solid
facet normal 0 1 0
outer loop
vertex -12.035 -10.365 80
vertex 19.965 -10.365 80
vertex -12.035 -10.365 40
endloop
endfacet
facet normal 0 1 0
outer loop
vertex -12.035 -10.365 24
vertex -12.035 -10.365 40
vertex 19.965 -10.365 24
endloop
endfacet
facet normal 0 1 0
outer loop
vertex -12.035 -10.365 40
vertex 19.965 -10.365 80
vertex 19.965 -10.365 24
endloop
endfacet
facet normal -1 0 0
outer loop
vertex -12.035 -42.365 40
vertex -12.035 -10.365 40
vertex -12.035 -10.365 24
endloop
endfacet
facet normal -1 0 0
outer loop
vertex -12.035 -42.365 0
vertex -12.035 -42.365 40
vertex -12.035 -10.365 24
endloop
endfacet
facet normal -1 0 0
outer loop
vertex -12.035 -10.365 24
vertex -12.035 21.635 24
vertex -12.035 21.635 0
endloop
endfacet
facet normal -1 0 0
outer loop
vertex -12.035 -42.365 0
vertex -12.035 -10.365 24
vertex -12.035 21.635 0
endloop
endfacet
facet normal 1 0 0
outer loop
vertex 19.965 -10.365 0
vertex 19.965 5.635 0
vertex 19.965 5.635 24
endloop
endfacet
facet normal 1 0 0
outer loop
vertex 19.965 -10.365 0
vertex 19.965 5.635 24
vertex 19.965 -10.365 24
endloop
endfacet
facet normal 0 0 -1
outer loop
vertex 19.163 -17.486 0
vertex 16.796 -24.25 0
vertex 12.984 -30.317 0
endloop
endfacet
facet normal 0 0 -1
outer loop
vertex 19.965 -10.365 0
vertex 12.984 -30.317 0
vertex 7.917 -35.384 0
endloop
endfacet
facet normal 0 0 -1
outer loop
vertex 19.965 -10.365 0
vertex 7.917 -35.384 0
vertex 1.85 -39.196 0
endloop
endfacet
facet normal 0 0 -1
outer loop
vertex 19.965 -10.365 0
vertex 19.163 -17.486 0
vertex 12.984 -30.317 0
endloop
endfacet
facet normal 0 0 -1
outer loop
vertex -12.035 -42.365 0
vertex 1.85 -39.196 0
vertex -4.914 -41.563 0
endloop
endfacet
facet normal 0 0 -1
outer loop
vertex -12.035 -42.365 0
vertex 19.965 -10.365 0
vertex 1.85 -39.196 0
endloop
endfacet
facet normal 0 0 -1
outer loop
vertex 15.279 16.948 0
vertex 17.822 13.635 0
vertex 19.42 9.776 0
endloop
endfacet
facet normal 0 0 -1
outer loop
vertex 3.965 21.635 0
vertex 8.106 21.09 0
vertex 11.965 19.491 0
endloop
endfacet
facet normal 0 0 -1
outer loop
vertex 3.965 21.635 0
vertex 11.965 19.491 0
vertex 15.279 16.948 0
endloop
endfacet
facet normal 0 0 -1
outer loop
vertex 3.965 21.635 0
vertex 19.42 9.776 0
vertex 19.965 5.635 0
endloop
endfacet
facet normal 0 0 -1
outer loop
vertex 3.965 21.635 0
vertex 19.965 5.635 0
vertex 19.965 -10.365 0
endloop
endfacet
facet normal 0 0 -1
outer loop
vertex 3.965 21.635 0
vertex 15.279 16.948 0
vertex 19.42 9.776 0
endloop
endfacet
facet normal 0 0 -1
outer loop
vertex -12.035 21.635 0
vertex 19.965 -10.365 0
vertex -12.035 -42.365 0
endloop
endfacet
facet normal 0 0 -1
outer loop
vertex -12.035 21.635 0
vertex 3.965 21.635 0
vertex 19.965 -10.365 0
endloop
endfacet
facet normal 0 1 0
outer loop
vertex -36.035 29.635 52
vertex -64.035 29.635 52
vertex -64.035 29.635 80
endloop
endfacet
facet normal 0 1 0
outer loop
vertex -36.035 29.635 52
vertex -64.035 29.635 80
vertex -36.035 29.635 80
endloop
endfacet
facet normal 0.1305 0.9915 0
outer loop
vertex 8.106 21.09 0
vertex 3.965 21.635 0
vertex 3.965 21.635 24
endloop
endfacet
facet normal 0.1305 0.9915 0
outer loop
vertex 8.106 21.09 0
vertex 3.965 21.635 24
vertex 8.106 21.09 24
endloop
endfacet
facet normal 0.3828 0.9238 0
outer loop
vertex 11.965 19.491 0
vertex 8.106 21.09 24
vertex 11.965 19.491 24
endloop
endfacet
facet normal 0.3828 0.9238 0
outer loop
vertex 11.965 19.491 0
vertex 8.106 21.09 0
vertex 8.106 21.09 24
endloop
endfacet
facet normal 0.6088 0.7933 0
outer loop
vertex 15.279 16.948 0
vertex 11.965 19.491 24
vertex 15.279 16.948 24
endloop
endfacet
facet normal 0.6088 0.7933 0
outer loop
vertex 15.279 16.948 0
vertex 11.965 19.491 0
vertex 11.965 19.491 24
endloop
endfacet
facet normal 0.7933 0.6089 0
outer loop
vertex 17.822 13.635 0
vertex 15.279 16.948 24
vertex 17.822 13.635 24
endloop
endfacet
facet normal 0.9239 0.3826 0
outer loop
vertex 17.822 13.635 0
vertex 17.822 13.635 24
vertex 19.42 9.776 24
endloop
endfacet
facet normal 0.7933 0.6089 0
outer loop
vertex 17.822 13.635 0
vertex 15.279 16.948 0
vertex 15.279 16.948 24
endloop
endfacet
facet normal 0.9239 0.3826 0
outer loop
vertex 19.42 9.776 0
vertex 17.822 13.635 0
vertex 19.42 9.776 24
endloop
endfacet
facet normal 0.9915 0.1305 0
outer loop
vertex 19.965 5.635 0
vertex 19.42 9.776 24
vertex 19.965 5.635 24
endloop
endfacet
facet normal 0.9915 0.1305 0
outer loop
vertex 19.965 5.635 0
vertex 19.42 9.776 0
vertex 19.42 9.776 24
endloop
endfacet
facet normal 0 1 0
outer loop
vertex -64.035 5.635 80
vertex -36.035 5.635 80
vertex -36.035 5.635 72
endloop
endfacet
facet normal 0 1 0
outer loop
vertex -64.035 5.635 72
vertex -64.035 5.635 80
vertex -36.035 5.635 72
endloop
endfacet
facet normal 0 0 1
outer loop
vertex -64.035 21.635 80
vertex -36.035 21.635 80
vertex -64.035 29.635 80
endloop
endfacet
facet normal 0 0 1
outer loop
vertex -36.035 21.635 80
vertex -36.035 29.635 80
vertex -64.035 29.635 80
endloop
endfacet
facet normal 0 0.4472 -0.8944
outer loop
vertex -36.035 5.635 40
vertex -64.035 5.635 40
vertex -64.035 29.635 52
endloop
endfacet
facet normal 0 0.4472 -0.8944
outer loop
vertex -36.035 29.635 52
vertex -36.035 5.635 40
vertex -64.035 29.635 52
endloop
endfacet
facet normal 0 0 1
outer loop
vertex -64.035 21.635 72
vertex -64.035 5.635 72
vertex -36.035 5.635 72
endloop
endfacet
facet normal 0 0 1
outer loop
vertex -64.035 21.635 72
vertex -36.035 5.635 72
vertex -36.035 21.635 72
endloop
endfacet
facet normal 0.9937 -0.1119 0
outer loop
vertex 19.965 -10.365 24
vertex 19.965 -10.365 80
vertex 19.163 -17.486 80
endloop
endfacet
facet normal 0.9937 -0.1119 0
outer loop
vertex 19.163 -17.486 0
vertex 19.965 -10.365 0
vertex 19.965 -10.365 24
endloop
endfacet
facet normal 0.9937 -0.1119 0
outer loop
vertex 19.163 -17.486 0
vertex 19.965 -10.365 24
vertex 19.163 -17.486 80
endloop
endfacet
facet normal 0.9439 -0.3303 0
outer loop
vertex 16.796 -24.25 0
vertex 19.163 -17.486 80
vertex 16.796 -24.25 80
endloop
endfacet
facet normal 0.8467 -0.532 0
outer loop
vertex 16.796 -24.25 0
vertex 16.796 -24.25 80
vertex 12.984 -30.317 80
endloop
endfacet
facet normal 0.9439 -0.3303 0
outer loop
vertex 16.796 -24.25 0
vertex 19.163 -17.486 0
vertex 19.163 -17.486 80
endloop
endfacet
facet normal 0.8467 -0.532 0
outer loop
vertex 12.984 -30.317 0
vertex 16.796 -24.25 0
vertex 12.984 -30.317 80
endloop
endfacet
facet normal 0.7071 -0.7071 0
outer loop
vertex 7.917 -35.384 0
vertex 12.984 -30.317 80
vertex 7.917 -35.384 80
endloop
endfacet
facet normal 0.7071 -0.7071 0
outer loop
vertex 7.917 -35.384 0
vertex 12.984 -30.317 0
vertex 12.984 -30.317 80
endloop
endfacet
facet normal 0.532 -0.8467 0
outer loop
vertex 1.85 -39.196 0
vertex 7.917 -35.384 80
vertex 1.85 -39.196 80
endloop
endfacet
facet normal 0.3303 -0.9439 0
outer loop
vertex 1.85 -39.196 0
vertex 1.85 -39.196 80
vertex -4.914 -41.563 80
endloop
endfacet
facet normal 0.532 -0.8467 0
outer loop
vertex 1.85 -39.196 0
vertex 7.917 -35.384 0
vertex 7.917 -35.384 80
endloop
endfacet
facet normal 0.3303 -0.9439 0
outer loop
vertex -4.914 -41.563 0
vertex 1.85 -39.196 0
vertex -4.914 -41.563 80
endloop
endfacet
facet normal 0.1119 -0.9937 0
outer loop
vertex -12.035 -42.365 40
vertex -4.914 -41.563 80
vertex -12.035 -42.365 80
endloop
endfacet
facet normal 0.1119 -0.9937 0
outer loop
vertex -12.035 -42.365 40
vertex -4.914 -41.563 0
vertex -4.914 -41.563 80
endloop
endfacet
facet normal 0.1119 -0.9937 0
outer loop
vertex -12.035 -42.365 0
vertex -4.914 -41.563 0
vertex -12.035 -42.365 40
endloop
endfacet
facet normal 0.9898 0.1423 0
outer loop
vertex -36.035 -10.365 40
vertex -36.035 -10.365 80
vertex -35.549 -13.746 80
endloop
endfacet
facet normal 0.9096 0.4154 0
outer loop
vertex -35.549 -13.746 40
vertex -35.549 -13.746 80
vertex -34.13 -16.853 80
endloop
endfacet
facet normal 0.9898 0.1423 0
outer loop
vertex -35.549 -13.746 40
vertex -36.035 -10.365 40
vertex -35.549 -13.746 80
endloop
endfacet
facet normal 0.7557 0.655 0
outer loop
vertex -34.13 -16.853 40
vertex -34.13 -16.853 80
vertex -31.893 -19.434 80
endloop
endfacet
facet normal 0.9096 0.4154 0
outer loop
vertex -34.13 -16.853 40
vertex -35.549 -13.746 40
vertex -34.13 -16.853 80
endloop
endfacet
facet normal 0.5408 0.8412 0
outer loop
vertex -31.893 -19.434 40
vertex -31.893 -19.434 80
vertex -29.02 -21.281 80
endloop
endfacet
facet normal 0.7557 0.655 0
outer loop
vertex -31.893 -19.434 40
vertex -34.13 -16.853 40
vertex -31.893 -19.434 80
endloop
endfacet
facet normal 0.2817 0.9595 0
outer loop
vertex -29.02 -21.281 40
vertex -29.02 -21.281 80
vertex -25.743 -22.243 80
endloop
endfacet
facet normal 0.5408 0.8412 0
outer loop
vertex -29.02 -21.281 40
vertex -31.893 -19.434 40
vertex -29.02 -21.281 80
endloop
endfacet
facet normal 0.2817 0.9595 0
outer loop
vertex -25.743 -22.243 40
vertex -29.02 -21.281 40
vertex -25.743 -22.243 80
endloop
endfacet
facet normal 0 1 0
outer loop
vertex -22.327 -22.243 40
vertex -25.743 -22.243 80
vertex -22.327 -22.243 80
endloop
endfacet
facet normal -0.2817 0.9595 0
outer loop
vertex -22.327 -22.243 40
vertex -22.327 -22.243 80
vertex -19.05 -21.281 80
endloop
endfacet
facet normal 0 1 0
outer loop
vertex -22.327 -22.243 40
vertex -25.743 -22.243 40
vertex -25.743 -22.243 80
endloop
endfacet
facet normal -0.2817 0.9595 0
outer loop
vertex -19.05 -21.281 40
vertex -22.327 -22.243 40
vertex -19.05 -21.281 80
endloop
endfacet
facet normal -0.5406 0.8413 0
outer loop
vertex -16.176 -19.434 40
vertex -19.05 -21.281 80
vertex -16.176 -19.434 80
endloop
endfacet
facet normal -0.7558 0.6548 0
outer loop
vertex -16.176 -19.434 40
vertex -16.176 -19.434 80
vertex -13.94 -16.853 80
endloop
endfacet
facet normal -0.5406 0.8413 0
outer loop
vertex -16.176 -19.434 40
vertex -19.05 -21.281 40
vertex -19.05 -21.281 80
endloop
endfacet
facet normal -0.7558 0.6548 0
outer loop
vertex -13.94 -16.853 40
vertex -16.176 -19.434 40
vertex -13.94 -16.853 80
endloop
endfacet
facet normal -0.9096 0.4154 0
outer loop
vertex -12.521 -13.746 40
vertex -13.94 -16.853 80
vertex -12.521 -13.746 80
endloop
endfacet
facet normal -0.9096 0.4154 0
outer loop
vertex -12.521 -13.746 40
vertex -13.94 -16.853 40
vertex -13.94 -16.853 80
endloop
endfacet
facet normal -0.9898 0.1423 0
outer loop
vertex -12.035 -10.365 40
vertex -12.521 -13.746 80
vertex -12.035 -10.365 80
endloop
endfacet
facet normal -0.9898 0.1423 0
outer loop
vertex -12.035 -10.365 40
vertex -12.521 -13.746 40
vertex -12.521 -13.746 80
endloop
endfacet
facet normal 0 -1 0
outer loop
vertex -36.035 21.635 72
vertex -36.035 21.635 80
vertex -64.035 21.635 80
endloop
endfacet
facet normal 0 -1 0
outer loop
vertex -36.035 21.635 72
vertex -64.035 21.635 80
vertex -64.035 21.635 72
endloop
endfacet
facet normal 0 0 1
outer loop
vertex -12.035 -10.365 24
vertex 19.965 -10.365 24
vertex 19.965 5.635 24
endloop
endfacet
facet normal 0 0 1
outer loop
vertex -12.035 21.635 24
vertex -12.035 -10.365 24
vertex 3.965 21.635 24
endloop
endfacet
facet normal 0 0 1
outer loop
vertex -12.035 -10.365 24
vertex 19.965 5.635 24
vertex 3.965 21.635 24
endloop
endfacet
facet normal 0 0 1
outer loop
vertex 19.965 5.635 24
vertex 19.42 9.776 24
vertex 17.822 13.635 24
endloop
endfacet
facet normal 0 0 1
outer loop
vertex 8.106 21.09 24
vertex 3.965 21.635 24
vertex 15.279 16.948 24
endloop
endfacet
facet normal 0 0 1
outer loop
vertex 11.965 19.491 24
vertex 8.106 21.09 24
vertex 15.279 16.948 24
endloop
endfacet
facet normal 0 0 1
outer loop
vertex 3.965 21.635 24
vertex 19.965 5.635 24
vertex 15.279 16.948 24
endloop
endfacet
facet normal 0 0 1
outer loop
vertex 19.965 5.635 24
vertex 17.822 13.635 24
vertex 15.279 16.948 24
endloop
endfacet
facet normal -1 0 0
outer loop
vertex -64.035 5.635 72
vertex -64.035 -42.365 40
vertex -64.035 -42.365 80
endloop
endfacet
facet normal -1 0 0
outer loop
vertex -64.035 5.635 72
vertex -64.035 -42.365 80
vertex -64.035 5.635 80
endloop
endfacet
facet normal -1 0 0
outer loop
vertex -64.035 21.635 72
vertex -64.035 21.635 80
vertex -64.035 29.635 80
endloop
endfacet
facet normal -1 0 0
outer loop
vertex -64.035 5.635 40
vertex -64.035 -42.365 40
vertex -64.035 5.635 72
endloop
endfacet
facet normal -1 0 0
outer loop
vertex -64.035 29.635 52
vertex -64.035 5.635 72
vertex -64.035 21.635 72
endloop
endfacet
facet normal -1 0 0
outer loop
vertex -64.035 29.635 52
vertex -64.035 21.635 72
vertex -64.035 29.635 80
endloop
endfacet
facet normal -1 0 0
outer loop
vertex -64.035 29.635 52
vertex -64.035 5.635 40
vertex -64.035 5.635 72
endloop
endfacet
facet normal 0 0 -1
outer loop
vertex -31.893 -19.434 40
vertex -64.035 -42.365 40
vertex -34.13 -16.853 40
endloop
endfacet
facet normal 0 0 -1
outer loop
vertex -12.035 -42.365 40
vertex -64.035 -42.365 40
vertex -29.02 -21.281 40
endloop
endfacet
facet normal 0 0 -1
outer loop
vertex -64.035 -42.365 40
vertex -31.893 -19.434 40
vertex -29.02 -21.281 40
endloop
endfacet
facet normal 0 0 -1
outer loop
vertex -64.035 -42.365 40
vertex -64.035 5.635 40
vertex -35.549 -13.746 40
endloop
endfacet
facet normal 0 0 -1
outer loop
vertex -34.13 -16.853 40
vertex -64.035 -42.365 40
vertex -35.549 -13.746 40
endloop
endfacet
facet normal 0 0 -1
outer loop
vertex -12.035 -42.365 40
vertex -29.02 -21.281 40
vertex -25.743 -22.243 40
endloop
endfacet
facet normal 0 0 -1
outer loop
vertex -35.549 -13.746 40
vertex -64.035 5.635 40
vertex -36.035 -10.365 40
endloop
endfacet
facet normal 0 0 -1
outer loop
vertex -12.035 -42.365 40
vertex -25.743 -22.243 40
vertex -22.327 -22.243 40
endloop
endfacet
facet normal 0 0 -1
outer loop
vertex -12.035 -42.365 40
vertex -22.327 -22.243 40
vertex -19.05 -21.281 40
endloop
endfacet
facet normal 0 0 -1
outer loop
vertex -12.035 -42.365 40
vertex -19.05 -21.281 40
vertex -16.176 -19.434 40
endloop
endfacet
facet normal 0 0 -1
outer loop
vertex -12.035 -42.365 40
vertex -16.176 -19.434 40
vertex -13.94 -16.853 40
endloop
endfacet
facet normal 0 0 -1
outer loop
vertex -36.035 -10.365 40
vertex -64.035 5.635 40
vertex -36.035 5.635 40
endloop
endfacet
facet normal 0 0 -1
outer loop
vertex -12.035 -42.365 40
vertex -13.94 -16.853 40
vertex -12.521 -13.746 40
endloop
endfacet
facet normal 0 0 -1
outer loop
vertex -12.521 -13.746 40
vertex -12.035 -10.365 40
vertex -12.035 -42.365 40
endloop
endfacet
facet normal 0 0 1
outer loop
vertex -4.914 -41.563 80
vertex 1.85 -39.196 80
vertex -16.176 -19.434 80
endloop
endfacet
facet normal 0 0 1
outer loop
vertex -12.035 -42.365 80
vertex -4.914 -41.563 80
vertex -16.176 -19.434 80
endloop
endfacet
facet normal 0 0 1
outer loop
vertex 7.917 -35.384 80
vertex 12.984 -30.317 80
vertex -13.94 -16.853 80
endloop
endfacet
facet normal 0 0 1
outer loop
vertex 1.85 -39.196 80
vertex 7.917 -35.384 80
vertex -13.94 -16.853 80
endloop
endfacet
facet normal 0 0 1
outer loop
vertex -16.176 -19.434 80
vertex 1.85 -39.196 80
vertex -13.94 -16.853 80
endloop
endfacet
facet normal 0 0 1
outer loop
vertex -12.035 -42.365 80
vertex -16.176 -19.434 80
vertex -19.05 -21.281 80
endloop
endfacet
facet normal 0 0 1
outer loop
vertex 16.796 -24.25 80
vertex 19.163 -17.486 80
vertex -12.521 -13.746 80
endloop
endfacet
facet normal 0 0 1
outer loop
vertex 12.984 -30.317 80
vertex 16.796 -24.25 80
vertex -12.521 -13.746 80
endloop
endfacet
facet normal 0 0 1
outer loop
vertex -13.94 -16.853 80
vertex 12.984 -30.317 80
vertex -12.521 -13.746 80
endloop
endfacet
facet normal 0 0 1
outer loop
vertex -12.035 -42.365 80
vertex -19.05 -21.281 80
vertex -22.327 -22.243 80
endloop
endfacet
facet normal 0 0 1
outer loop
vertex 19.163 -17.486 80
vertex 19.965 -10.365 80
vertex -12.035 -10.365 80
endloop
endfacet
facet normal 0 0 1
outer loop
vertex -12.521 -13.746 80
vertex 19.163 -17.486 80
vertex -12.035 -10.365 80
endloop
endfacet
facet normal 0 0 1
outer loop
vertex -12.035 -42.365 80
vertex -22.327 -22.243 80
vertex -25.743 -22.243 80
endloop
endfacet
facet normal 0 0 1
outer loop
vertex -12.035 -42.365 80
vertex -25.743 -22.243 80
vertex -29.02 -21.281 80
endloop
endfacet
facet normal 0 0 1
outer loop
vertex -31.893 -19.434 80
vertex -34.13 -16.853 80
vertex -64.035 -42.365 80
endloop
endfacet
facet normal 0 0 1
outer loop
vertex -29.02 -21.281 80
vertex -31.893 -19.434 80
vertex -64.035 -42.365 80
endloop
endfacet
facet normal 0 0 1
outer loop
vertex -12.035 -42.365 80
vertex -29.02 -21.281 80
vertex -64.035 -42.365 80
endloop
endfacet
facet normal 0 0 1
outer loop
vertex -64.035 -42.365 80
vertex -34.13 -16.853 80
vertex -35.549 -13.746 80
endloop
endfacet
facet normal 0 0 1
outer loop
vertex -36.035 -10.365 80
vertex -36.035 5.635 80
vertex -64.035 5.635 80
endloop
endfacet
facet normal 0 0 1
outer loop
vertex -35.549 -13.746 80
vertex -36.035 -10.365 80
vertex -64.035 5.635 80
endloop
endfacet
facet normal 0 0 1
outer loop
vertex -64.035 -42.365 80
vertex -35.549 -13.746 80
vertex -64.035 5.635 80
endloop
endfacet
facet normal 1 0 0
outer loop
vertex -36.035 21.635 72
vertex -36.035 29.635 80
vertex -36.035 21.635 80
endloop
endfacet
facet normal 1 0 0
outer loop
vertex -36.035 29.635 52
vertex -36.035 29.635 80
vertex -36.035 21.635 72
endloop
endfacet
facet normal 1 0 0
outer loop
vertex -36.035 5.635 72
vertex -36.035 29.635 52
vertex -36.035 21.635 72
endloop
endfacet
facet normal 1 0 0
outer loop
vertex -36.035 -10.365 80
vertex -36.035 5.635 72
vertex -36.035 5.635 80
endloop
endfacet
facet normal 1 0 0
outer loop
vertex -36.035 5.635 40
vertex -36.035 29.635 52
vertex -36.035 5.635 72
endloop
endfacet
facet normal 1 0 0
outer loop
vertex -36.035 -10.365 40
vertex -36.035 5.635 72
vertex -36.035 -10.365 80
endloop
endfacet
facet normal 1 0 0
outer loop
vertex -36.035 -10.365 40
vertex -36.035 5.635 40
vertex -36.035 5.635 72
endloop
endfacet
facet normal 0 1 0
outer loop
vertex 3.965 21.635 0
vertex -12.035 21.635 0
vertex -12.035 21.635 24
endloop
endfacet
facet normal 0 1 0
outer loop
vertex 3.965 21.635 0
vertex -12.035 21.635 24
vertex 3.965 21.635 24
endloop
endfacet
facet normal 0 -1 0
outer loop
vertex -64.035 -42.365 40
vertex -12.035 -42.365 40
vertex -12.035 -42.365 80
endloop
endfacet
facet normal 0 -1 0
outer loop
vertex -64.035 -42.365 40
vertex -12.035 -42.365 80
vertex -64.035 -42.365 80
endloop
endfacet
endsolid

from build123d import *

# Parameters (mm, degrees)
BOSS_EXTRUDE1_DEPTH = 80
SKETCH2_W           = 56
SKETCH2_H           = 40
CUT_EXTRUDE1_DEPTH  = 32
SKETCH3_W           = 52
SKETCH3_H           = 40
CUT_EXTRUDE2_DEPTH  = 100
CUT_EXTRUDE3_DEPTH  = 100
SKETCH5_W           = 8
SKETCH5_H           = 16
CUT_EXTRUDE4_DEPTH  = 100


with BuildPart() as part:
    # Sketch1 → Boss-Extrude1 (new body)
    with BuildSketch(Plane.XY):
        with BuildLine():
            Line((-64.034777708, 29.634699451), (-36.034777708, 29.634699451))
            Line((-36.034777708, 29.634699451), (-36.034777708, -10.365300549))
            ThreePointArc((-36.034777708, -10.365300549), (-24.034777708, -22.365300549), (-12.034777708, -10.365300549))
            Line((-12.034777708, -10.365300549), (-12.034777708, 21.634699451))
            Line((-12.034777708, 21.634699451), (3.965222292, 21.634699451))
            ThreePointArc((3.965222292, 21.634699451), (15.278930791, 16.94840795), (19.965222292, 5.634699451))
            Line((19.965222292, 5.634699451), (19.965222292, -10.365300549))
            ThreePointArc((19.965222292, -10.365300549), (10.59263929, -32.992717547), (-12.034777708, -42.365300549))
            Line((-12.034777708, -42.365300549), (-64.034777708, -42.365300549))
            Line((-64.034777708, -42.365300549), (-64.034777708, 29.634699451))
        make_face()
    extrude(amount=BOSS_EXTRUDE1_DEPTH)

    # Sketch2 → Cut-Extrude1 (cut)
    with BuildSketch(Plane(origin=(19.965222292, 0, 0), x_dir=(0, 0, -1), z_dir=(1, 0, 0))):
        with Locations((-52, 9.634699451)):
            Rectangle(SKETCH2_W, SKETCH2_H)
    extrude(amount=-CUT_EXTRUDE1_DEPTH, mode=Mode.SUBTRACT)

    # Sketch3 → Cut-Extrude2 (cut)
    with BuildSketch(Plane(origin=(0, 29.634699451, 0), x_dir=(1, 0, 0), z_dir=(0, 1, 0))):
        with Locations((-38.034777708, -20)):
            Rectangle(SKETCH3_W, SKETCH3_H)
    extrude(amount=-CUT_EXTRUDE2_DEPTH, mode=Mode.SUBTRACT)

    # Sketch4 → Cut-Extrude3 (cut)
    with BuildSketch(Plane(origin=(-36.034777708, 0, 0), x_dir=(0, 0, -1), z_dir=(1, 0, 0))):
        Polygon((-40, 29.634699451), (-40, 5.634699451), (-52, 29.634699451), align=None)
    extrude(amount=-CUT_EXTRUDE3_DEPTH, mode=Mode.SUBTRACT)

    # Sketch5 → Cut-Extrude4 (cut)
    with BuildSketch(Plane(origin=(0, 0, 0), x_dir=(0, 0, -1), z_dir=(1, 0, 0))):
        with Locations((-76, 13.634699451)):
            Rectangle(SKETCH5_W, SKETCH5_H)
    extrude(amount=-CUT_EXTRUDE4_DEPTH, mode=Mode.SUBTRACT)


solid = part.part
